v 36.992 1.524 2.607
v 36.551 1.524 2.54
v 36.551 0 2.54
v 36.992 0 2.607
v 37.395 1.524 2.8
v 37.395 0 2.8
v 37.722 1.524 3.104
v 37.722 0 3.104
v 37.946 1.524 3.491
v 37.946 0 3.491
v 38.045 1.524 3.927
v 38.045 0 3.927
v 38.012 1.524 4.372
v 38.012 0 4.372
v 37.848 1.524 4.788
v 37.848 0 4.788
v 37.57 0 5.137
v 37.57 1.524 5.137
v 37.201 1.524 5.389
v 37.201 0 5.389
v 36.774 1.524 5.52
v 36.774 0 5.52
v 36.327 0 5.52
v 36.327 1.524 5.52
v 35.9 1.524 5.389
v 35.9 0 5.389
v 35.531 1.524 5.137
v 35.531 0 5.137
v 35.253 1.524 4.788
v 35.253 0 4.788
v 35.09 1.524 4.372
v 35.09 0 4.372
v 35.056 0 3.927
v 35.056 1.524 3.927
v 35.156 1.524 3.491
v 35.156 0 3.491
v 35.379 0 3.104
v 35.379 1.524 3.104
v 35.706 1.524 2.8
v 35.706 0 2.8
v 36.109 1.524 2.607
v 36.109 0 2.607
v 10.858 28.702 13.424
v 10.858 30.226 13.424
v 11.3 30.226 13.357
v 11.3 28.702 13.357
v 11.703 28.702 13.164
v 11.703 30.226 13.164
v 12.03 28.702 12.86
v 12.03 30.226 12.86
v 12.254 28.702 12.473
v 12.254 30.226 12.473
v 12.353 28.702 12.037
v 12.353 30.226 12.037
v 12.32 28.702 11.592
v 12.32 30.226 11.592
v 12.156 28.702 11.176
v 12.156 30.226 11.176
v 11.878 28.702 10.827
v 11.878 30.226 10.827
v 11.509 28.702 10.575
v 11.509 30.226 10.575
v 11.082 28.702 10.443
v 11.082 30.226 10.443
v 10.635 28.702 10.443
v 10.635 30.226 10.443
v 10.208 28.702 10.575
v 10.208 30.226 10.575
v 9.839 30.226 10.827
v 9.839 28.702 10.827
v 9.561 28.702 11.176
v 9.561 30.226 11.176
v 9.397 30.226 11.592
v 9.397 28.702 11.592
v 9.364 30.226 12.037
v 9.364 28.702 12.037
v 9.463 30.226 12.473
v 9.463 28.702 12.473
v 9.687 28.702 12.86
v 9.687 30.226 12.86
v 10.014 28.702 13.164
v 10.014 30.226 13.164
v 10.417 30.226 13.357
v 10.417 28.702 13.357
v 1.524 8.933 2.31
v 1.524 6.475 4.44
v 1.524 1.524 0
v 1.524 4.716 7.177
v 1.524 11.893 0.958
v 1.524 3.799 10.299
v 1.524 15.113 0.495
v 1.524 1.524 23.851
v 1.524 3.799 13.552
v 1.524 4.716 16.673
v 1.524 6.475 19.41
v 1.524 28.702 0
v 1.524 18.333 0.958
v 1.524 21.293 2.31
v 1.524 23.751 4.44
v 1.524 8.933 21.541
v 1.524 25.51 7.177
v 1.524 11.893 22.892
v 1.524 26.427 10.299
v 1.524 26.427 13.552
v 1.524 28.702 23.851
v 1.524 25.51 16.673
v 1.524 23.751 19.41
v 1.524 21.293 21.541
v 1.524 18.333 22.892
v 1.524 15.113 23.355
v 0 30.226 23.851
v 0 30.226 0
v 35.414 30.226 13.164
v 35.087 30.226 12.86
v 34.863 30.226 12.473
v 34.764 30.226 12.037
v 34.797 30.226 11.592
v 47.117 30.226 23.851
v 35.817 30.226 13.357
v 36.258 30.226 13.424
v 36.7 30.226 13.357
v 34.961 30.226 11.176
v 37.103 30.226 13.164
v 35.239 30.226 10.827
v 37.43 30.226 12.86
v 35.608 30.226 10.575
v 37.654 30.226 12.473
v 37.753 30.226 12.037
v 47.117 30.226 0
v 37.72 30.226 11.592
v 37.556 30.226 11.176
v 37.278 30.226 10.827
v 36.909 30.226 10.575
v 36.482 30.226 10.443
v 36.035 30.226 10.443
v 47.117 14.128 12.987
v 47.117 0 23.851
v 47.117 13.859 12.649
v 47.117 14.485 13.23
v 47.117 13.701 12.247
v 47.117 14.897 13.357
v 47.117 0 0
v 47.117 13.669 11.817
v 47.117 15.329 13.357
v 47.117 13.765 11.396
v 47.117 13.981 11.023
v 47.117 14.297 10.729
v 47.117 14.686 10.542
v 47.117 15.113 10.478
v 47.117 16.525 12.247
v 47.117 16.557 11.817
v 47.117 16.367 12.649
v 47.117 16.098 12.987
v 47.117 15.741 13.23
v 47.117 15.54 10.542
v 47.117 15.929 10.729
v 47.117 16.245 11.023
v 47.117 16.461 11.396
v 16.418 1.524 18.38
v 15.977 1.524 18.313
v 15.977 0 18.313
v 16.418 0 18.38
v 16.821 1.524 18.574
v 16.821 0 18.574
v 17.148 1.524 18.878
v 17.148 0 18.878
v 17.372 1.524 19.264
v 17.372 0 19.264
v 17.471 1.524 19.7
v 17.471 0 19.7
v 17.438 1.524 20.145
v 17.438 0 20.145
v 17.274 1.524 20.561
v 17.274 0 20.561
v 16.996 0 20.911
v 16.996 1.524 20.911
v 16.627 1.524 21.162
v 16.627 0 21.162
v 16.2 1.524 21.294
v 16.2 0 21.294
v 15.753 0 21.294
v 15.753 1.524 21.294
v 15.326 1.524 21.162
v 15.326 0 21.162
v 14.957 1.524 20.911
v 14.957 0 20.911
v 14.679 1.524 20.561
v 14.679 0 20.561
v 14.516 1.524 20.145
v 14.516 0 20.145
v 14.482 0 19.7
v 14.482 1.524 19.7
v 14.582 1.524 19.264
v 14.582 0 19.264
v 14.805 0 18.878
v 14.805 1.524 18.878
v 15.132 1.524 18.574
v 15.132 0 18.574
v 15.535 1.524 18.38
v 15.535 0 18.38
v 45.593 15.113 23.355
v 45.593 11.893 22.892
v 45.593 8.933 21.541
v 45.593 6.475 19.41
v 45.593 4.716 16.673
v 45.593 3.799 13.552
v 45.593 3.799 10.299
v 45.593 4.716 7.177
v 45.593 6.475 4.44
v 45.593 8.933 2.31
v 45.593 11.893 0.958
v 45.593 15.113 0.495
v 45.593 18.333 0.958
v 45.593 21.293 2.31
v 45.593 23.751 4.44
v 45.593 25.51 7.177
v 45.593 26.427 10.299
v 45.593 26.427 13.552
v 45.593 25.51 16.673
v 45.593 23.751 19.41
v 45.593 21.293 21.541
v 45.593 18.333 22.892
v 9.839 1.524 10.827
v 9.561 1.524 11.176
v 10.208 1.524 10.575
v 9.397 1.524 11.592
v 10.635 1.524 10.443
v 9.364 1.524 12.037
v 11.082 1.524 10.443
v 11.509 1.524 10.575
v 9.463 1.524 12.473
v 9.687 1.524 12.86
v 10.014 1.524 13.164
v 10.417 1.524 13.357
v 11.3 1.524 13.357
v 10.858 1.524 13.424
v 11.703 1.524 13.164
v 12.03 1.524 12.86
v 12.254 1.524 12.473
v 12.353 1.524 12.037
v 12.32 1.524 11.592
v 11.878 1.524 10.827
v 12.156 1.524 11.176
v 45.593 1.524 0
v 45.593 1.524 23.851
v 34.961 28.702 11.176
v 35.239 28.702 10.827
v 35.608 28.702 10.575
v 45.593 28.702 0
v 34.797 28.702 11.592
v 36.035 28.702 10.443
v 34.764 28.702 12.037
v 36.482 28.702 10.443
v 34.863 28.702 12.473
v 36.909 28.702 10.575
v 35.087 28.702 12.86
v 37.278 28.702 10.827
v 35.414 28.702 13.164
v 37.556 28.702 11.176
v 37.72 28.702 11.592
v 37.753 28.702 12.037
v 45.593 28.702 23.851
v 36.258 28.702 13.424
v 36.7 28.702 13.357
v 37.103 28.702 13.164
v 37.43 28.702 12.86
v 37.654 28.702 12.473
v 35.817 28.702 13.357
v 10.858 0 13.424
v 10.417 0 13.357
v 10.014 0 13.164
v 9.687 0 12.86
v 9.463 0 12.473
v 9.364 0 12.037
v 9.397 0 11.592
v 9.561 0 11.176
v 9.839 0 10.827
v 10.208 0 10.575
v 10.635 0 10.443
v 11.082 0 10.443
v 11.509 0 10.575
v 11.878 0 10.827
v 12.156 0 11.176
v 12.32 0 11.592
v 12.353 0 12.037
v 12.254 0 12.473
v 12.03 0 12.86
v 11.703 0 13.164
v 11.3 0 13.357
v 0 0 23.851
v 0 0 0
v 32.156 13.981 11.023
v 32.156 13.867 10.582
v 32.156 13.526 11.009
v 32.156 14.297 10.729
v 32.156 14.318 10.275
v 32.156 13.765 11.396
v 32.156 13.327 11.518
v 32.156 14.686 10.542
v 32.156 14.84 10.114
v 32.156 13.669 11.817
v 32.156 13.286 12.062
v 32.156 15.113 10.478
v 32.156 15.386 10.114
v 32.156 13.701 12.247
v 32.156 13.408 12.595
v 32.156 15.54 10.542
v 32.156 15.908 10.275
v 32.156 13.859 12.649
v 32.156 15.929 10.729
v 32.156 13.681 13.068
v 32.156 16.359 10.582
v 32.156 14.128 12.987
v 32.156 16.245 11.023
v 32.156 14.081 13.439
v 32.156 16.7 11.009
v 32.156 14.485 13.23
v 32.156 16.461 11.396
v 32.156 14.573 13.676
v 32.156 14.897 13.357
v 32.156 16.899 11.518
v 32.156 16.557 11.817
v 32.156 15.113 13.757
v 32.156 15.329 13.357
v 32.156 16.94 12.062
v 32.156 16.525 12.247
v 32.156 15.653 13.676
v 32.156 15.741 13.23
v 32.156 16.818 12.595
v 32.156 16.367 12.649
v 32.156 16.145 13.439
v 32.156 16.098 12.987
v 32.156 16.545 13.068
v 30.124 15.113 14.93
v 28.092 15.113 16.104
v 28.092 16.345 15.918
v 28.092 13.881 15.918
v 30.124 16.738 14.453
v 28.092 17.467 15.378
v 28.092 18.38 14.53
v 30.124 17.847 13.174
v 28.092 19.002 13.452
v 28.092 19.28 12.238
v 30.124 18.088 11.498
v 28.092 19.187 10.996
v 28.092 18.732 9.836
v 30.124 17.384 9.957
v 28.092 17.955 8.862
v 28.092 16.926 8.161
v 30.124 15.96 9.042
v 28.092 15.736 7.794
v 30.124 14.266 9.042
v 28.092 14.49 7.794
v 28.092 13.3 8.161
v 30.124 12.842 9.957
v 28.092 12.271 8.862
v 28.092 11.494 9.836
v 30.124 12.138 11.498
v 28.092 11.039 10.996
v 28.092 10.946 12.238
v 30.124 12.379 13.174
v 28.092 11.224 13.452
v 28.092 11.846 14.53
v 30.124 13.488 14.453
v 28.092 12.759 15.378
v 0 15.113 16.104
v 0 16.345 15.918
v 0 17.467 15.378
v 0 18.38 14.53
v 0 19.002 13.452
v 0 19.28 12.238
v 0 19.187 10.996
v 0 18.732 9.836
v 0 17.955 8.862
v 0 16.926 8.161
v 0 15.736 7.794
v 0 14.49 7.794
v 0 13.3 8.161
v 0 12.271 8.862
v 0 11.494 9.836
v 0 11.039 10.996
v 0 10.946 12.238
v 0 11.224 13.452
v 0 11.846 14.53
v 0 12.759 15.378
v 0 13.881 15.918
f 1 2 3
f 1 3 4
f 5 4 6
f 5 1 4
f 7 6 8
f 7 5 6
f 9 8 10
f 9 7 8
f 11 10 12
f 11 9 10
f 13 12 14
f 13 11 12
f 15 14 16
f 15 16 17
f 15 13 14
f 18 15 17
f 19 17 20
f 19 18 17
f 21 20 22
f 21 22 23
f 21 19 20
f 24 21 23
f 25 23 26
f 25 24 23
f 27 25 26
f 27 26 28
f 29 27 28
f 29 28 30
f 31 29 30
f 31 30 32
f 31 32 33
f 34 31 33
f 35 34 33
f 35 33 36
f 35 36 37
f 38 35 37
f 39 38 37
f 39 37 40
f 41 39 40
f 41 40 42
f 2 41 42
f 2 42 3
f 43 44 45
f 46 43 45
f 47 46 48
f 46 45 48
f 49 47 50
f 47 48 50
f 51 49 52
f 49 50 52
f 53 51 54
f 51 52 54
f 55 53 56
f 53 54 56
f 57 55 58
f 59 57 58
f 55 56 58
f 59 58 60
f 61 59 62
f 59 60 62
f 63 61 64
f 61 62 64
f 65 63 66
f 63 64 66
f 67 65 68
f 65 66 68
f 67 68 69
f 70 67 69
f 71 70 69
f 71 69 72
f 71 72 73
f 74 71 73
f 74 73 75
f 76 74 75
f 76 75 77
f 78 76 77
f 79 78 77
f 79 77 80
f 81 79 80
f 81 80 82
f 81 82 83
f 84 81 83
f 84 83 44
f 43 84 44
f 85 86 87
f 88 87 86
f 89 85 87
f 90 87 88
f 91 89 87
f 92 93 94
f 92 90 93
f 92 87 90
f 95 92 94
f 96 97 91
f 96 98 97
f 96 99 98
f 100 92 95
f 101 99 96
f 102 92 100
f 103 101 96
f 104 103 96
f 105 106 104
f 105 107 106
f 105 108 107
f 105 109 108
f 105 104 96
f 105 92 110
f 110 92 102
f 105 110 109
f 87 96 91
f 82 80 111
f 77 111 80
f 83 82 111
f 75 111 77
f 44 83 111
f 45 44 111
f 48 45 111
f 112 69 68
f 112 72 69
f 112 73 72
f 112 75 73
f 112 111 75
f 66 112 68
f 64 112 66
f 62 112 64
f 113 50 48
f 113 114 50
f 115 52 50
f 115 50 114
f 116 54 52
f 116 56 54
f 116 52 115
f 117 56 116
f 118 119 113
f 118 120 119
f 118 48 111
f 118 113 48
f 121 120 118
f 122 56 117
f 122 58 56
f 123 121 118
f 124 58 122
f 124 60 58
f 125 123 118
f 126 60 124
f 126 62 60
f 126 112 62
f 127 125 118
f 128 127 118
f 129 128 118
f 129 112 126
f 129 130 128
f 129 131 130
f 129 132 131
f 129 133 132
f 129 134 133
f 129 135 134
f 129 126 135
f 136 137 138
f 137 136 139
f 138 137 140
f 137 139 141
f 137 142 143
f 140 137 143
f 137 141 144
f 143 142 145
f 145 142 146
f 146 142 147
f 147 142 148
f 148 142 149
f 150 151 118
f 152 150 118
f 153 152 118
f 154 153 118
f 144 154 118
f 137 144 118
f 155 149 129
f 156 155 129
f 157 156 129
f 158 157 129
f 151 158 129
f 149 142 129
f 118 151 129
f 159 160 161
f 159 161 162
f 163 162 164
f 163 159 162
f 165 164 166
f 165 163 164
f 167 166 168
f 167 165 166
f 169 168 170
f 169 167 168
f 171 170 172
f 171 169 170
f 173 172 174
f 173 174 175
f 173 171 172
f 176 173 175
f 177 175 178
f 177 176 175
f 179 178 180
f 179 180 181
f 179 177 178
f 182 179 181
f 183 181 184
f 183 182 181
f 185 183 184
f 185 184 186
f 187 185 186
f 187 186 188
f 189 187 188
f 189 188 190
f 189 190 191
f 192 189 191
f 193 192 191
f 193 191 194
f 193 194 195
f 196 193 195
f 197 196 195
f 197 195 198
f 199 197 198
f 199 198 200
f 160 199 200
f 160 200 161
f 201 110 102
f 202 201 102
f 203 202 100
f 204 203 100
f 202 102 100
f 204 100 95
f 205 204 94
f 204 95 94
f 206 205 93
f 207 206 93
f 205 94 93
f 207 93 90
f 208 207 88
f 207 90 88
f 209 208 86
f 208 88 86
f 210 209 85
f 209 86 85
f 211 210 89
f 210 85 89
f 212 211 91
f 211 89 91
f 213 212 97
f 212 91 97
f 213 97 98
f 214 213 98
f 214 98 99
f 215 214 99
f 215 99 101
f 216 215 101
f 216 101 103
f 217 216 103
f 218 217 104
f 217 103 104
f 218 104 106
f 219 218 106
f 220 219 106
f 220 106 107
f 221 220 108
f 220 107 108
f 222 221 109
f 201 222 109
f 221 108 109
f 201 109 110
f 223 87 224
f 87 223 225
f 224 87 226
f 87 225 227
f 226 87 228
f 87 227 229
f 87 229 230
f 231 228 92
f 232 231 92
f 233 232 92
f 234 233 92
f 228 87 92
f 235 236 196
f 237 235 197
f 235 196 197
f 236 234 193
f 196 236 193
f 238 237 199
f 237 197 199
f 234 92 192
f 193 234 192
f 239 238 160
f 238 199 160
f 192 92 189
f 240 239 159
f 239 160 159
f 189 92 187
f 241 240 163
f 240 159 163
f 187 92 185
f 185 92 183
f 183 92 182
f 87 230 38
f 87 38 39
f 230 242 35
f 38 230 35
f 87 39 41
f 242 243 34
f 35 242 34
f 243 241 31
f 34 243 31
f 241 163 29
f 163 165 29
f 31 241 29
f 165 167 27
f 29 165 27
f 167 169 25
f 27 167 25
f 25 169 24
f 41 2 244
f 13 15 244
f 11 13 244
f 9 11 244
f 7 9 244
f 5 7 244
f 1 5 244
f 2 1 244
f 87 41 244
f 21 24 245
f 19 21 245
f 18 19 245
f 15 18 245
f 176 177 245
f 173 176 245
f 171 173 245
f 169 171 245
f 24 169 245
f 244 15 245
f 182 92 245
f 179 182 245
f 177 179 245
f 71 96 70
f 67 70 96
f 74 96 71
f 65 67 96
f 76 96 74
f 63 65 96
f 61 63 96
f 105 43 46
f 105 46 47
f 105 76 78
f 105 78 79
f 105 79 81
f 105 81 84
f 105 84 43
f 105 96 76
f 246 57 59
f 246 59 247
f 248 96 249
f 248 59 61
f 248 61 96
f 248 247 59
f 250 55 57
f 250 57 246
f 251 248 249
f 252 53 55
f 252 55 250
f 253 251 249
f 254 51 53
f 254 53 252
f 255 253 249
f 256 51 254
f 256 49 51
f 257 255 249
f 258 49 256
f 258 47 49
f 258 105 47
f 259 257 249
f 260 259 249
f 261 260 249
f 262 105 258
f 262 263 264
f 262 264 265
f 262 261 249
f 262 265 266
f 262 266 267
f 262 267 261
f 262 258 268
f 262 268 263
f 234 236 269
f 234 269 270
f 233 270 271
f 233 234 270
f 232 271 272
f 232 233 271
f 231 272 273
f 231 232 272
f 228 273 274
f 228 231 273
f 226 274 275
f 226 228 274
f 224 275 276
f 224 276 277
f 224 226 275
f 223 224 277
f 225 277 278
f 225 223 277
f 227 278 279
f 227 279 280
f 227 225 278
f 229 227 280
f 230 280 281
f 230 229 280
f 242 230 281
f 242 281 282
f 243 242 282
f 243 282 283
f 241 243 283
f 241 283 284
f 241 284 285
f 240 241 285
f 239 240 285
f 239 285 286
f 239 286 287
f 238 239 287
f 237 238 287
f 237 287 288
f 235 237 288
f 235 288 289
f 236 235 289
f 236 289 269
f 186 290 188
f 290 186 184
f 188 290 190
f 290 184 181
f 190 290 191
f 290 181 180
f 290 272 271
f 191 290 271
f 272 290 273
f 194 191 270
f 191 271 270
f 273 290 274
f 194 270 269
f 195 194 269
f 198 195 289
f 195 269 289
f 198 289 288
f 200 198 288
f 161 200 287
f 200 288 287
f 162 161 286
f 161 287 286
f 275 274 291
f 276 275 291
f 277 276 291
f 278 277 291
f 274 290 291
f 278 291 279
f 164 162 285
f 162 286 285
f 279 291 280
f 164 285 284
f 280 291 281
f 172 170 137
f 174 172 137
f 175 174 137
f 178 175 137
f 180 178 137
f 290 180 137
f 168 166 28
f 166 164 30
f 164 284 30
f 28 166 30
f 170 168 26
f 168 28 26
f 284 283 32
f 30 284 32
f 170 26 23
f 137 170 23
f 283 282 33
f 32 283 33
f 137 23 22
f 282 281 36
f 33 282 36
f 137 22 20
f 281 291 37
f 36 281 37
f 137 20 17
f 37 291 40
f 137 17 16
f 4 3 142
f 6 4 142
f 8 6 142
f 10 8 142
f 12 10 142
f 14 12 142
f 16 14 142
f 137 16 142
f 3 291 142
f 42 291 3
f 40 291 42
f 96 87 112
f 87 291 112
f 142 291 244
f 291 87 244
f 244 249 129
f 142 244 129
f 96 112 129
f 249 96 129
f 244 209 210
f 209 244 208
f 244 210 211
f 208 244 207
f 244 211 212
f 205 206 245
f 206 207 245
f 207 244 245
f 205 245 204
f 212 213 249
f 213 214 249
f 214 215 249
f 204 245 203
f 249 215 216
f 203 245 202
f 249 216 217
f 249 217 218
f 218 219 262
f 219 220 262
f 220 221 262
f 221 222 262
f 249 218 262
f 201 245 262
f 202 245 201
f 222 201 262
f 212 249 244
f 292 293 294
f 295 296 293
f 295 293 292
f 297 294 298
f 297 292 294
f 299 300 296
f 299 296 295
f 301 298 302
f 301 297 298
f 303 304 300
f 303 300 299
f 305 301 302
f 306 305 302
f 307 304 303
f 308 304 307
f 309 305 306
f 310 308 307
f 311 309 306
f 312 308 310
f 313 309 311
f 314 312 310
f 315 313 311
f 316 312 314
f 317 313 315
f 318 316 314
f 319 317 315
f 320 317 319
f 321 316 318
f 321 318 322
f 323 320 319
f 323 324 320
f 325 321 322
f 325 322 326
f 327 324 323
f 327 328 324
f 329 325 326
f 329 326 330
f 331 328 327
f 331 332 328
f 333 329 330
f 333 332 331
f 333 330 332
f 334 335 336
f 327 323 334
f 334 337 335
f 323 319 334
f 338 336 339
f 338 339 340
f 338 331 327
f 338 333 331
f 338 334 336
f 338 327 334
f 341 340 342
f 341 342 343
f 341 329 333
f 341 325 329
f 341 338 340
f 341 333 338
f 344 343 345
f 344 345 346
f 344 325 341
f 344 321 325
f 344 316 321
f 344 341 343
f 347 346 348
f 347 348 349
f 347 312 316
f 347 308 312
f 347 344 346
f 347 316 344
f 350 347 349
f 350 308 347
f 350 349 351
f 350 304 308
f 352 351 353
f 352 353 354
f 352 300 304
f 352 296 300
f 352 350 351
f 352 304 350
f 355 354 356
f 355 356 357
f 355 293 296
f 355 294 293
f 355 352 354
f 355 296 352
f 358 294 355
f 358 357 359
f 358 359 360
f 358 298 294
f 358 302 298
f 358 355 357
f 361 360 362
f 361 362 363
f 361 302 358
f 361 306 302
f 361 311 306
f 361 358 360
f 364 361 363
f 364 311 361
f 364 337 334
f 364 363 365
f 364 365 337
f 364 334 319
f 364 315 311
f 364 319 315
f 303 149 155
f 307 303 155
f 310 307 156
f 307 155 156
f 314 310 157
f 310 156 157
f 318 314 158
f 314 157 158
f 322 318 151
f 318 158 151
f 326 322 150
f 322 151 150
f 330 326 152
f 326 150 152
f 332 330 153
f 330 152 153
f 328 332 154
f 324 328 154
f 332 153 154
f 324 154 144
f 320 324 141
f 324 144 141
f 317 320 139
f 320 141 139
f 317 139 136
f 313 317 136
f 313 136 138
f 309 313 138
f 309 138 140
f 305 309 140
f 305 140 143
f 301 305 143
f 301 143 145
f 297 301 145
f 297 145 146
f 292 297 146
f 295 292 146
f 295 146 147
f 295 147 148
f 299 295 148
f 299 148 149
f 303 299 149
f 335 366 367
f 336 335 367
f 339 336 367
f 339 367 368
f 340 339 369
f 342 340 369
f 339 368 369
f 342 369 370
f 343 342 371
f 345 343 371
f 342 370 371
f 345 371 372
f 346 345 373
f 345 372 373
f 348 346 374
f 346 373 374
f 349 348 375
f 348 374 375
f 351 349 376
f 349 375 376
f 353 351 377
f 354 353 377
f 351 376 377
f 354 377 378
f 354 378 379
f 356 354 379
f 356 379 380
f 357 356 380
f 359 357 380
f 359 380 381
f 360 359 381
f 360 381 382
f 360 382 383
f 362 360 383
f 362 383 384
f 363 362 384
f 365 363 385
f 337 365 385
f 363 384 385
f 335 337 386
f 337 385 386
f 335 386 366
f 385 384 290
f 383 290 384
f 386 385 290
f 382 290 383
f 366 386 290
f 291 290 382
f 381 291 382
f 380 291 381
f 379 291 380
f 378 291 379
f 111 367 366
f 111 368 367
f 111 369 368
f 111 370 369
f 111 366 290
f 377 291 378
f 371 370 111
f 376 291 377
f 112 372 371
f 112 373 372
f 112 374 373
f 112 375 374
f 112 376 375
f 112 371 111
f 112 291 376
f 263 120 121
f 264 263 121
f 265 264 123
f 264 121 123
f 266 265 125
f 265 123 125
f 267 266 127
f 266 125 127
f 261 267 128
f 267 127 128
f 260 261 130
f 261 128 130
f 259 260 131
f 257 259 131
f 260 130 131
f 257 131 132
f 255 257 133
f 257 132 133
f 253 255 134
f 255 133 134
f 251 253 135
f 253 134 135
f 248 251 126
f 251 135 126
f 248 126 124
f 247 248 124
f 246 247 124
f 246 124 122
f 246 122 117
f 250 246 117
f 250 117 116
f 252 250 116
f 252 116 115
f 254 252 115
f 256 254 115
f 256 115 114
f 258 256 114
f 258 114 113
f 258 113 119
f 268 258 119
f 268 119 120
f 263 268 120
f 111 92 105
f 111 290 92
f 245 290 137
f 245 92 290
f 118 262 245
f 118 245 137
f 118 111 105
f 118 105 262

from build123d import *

# Parameters (mm, degrees)
SKETCH1_W           = 47.117
SKETCH1_H           = 30.226
BOSS_EXTRUDE1_DEPTH = 23.8506
SKETCH4_W           = 44.069
SKETCH4_H           = 27.178
CUT_EXTRUDE1_DEPTH  = 61.847957117
SKETCH5_R           = 11.43
BOSS_EXTRUDE3_DEPTH = 44.069
SKETCH3_R           = 1.4986
CUT_EXTRUDE2_DEPTH  = 2.54
CUT_EXTRUDE3_START  = -2.54
SKETCH6_R           = 1.4986
CUT_EXTRUDE3_DEPTH  = 2.54
SKETCH2_R           = 1.4478
CUT_EXTRUDE4_DEPTH  = 61.847957117
SKETCH7_R           = 4.1783
CUT_EXTRUDE5_DEPTH  = 32.1564
CHAMFER1_SIZE       = 4.064
CHAMFER1_SIZE2      = 2.346351494


with BuildPart() as part:
    # Sketch1 → Boss-Extrude1 (new body)
    with BuildSketch(Plane.XY):
        with Locations((23.5585, 15.113)):
            Rectangle(SKETCH1_W, SKETCH1_H)
    extrude(amount=BOSS_EXTRUDE1_DEPTH)

    # Sketch4 → Cut-Extrude1 (cut, through all)
    with BuildSketch(Plane.XY.offset(23.8506)):
        with Locations((23.5585, 15.113)):
            Rectangle(SKETCH4_W, SKETCH4_H)
    extrude(amount=-CUT_EXTRUDE1_DEPTH, mode=Mode.SUBTRACT)

    # Sketch5 → Boss-Extrude3 (add)
    with BuildSketch(Plane(origin=(1.524, 0, 0), x_dir=(0, 0, -1), z_dir=(1, 0, 0))):
        with Locations(Location((-11.9253, 15.113, 0), (0, 0, 180))):
            Circle(SKETCH5_R)
    extrude(amount=BOSS_EXTRUDE3_DEPTH)

    # Sketch3 → Cut-Extrude2 (cut)
    with BuildSketch(Plane(origin=(0, 30.226, 0), x_dir=(1, 0, 0), z_dir=(0, 1, 0))):
        with Locations(Location((10.8585, -11.9253, 0), (0, 0, 270))):
            Circle(SKETCH3_R)
        with Locations(Location((36.2585, -11.9253, 0), (0, 0, 270))):
            Circle(SKETCH3_R)
    extrude(amount=-CUT_EXTRUDE2_DEPTH, mode=Mode.SUBTRACT)

    # Sketch6 → Cut-Extrude3 (cut)
    with BuildSketch(Plane.XZ.offset(CUT_EXTRUDE3_START)):
        with Locations(Location((15.9766, 19.812, 0), (0, 0, 270))):
            Circle(SKETCH6_R)
        with Locations(Location((10.8585, 11.9253, 0), (0, 0, 90))):
            Circle(SKETCH6_R)
        with Locations(Location((36.5506, 4.0386, 0), (0, 0, 270))):
            Circle(SKETCH6_R)
    extrude(amount=CUT_EXTRUDE3_DEPTH, mode=Mode.SUBTRACT)

    # Sketch2 → Cut-Extrude4 (cut, through all)
    with BuildSketch(Plane(origin=(47.117, 0, 0), x_dir=(0, 0, -1), z_dir=(1, 0, 0))):
        with Locations((-11.9253, 15.113)):
            Circle(SKETCH2_R)
    extrude(amount=-CUT_EXTRUDE4_DEPTH, mode=Mode.SUBTRACT)

    # Sketch7 → Cut-Extrude5 (cut)
    with BuildSketch(Plane.ZY):
        with Locations((11.9253, 15.113)):
            Circle(SKETCH7_R)
    extrude(amount=-CUT_EXTRUDE5_DEPTH, mode=Mode.SUBTRACT)

    # Chamfer1
    chamfer1_edges = [part.edges().sort_by_distance(p)[0] for p in [
        (32.1564, 15.113, 7.747),
    ]]
    chamfer1_side = [part.faces().sort_by_distance(p)[0] for p in [
        (16.0782, 15.113, 7.747),
    ]]
    chamfer(chamfer1_edges, length=CHAMFER1_SIZE, length2=CHAMFER1_SIZE2, reference=chamfer1_side[0])


solid = part.part
